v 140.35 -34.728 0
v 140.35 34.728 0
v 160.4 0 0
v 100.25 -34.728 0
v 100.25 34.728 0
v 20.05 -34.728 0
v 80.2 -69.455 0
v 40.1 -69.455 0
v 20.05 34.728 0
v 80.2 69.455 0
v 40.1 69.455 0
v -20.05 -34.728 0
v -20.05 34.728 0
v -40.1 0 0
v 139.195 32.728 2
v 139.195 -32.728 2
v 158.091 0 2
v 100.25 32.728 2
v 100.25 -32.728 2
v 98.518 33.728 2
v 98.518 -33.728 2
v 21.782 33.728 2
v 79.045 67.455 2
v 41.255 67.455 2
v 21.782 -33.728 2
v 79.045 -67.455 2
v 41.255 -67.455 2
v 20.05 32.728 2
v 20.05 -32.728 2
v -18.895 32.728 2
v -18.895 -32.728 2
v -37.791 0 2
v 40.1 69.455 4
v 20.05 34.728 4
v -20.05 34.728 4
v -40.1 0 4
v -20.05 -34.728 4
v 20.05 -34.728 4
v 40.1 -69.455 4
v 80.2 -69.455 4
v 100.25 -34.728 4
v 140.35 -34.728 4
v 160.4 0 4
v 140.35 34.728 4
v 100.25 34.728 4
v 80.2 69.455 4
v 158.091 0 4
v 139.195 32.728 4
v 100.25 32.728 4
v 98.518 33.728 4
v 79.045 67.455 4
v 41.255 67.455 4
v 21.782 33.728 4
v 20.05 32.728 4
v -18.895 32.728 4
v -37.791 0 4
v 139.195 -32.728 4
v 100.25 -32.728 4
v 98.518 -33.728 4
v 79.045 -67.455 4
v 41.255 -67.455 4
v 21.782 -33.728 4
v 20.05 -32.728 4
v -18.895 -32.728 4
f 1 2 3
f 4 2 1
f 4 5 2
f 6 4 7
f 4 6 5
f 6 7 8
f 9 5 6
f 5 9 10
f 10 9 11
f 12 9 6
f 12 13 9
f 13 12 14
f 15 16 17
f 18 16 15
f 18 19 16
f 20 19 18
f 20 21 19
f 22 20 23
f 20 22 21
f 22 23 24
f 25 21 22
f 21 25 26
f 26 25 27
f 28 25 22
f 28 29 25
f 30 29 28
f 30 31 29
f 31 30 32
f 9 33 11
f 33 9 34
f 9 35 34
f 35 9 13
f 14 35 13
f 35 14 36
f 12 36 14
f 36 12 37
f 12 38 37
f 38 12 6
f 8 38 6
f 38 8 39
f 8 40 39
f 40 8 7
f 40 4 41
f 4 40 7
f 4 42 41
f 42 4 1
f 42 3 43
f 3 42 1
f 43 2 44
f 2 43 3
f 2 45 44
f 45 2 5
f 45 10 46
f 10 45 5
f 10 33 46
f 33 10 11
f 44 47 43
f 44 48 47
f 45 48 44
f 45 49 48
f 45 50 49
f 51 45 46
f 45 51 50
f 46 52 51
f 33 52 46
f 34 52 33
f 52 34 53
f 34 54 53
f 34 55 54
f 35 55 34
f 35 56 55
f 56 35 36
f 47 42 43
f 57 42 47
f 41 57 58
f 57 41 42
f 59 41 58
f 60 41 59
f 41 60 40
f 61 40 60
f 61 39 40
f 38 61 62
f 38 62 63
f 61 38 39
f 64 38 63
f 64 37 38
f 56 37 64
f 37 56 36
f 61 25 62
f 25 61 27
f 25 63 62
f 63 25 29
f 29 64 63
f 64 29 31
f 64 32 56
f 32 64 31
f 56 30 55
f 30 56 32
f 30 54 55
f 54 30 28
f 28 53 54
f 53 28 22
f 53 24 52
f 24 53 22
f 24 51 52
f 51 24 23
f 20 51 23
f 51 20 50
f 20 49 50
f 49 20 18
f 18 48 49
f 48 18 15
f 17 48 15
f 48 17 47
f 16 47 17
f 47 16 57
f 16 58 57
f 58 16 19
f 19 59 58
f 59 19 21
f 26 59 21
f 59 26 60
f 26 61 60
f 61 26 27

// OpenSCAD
inch = 25.4;
hex_h = 2;
border_height = 2;
border_thickness = 2;
hex_r = 1.5 * inch;

module hexagons() {
    radius = hex_r + border_thickness;
    union() {
        circle(r = radius, $fn = 6);
        translate([(radius * 1.5), (cos(30) * radius), 0]) {
            circle(r = radius, $fn = 6);
        }
        translate([(radius * 1.5), (-cos(30) * radius), 0]) {
            circle(r = radius, $fn = 6);
        }
        translate([radius * 3, 0, 0]) {
            circle(r = radius, $fn = 6);
        }
    }
}

// the object itself
linear_extrude(hex_h) {
   hexagons();
}

linear_extrude(hex_h + border_height) {
    difference() {
        // outer boundary
        hexagons();
        // remove an inset copy
        offset(-border_thickness) {
            hexagons(); 
        }
    }
}
